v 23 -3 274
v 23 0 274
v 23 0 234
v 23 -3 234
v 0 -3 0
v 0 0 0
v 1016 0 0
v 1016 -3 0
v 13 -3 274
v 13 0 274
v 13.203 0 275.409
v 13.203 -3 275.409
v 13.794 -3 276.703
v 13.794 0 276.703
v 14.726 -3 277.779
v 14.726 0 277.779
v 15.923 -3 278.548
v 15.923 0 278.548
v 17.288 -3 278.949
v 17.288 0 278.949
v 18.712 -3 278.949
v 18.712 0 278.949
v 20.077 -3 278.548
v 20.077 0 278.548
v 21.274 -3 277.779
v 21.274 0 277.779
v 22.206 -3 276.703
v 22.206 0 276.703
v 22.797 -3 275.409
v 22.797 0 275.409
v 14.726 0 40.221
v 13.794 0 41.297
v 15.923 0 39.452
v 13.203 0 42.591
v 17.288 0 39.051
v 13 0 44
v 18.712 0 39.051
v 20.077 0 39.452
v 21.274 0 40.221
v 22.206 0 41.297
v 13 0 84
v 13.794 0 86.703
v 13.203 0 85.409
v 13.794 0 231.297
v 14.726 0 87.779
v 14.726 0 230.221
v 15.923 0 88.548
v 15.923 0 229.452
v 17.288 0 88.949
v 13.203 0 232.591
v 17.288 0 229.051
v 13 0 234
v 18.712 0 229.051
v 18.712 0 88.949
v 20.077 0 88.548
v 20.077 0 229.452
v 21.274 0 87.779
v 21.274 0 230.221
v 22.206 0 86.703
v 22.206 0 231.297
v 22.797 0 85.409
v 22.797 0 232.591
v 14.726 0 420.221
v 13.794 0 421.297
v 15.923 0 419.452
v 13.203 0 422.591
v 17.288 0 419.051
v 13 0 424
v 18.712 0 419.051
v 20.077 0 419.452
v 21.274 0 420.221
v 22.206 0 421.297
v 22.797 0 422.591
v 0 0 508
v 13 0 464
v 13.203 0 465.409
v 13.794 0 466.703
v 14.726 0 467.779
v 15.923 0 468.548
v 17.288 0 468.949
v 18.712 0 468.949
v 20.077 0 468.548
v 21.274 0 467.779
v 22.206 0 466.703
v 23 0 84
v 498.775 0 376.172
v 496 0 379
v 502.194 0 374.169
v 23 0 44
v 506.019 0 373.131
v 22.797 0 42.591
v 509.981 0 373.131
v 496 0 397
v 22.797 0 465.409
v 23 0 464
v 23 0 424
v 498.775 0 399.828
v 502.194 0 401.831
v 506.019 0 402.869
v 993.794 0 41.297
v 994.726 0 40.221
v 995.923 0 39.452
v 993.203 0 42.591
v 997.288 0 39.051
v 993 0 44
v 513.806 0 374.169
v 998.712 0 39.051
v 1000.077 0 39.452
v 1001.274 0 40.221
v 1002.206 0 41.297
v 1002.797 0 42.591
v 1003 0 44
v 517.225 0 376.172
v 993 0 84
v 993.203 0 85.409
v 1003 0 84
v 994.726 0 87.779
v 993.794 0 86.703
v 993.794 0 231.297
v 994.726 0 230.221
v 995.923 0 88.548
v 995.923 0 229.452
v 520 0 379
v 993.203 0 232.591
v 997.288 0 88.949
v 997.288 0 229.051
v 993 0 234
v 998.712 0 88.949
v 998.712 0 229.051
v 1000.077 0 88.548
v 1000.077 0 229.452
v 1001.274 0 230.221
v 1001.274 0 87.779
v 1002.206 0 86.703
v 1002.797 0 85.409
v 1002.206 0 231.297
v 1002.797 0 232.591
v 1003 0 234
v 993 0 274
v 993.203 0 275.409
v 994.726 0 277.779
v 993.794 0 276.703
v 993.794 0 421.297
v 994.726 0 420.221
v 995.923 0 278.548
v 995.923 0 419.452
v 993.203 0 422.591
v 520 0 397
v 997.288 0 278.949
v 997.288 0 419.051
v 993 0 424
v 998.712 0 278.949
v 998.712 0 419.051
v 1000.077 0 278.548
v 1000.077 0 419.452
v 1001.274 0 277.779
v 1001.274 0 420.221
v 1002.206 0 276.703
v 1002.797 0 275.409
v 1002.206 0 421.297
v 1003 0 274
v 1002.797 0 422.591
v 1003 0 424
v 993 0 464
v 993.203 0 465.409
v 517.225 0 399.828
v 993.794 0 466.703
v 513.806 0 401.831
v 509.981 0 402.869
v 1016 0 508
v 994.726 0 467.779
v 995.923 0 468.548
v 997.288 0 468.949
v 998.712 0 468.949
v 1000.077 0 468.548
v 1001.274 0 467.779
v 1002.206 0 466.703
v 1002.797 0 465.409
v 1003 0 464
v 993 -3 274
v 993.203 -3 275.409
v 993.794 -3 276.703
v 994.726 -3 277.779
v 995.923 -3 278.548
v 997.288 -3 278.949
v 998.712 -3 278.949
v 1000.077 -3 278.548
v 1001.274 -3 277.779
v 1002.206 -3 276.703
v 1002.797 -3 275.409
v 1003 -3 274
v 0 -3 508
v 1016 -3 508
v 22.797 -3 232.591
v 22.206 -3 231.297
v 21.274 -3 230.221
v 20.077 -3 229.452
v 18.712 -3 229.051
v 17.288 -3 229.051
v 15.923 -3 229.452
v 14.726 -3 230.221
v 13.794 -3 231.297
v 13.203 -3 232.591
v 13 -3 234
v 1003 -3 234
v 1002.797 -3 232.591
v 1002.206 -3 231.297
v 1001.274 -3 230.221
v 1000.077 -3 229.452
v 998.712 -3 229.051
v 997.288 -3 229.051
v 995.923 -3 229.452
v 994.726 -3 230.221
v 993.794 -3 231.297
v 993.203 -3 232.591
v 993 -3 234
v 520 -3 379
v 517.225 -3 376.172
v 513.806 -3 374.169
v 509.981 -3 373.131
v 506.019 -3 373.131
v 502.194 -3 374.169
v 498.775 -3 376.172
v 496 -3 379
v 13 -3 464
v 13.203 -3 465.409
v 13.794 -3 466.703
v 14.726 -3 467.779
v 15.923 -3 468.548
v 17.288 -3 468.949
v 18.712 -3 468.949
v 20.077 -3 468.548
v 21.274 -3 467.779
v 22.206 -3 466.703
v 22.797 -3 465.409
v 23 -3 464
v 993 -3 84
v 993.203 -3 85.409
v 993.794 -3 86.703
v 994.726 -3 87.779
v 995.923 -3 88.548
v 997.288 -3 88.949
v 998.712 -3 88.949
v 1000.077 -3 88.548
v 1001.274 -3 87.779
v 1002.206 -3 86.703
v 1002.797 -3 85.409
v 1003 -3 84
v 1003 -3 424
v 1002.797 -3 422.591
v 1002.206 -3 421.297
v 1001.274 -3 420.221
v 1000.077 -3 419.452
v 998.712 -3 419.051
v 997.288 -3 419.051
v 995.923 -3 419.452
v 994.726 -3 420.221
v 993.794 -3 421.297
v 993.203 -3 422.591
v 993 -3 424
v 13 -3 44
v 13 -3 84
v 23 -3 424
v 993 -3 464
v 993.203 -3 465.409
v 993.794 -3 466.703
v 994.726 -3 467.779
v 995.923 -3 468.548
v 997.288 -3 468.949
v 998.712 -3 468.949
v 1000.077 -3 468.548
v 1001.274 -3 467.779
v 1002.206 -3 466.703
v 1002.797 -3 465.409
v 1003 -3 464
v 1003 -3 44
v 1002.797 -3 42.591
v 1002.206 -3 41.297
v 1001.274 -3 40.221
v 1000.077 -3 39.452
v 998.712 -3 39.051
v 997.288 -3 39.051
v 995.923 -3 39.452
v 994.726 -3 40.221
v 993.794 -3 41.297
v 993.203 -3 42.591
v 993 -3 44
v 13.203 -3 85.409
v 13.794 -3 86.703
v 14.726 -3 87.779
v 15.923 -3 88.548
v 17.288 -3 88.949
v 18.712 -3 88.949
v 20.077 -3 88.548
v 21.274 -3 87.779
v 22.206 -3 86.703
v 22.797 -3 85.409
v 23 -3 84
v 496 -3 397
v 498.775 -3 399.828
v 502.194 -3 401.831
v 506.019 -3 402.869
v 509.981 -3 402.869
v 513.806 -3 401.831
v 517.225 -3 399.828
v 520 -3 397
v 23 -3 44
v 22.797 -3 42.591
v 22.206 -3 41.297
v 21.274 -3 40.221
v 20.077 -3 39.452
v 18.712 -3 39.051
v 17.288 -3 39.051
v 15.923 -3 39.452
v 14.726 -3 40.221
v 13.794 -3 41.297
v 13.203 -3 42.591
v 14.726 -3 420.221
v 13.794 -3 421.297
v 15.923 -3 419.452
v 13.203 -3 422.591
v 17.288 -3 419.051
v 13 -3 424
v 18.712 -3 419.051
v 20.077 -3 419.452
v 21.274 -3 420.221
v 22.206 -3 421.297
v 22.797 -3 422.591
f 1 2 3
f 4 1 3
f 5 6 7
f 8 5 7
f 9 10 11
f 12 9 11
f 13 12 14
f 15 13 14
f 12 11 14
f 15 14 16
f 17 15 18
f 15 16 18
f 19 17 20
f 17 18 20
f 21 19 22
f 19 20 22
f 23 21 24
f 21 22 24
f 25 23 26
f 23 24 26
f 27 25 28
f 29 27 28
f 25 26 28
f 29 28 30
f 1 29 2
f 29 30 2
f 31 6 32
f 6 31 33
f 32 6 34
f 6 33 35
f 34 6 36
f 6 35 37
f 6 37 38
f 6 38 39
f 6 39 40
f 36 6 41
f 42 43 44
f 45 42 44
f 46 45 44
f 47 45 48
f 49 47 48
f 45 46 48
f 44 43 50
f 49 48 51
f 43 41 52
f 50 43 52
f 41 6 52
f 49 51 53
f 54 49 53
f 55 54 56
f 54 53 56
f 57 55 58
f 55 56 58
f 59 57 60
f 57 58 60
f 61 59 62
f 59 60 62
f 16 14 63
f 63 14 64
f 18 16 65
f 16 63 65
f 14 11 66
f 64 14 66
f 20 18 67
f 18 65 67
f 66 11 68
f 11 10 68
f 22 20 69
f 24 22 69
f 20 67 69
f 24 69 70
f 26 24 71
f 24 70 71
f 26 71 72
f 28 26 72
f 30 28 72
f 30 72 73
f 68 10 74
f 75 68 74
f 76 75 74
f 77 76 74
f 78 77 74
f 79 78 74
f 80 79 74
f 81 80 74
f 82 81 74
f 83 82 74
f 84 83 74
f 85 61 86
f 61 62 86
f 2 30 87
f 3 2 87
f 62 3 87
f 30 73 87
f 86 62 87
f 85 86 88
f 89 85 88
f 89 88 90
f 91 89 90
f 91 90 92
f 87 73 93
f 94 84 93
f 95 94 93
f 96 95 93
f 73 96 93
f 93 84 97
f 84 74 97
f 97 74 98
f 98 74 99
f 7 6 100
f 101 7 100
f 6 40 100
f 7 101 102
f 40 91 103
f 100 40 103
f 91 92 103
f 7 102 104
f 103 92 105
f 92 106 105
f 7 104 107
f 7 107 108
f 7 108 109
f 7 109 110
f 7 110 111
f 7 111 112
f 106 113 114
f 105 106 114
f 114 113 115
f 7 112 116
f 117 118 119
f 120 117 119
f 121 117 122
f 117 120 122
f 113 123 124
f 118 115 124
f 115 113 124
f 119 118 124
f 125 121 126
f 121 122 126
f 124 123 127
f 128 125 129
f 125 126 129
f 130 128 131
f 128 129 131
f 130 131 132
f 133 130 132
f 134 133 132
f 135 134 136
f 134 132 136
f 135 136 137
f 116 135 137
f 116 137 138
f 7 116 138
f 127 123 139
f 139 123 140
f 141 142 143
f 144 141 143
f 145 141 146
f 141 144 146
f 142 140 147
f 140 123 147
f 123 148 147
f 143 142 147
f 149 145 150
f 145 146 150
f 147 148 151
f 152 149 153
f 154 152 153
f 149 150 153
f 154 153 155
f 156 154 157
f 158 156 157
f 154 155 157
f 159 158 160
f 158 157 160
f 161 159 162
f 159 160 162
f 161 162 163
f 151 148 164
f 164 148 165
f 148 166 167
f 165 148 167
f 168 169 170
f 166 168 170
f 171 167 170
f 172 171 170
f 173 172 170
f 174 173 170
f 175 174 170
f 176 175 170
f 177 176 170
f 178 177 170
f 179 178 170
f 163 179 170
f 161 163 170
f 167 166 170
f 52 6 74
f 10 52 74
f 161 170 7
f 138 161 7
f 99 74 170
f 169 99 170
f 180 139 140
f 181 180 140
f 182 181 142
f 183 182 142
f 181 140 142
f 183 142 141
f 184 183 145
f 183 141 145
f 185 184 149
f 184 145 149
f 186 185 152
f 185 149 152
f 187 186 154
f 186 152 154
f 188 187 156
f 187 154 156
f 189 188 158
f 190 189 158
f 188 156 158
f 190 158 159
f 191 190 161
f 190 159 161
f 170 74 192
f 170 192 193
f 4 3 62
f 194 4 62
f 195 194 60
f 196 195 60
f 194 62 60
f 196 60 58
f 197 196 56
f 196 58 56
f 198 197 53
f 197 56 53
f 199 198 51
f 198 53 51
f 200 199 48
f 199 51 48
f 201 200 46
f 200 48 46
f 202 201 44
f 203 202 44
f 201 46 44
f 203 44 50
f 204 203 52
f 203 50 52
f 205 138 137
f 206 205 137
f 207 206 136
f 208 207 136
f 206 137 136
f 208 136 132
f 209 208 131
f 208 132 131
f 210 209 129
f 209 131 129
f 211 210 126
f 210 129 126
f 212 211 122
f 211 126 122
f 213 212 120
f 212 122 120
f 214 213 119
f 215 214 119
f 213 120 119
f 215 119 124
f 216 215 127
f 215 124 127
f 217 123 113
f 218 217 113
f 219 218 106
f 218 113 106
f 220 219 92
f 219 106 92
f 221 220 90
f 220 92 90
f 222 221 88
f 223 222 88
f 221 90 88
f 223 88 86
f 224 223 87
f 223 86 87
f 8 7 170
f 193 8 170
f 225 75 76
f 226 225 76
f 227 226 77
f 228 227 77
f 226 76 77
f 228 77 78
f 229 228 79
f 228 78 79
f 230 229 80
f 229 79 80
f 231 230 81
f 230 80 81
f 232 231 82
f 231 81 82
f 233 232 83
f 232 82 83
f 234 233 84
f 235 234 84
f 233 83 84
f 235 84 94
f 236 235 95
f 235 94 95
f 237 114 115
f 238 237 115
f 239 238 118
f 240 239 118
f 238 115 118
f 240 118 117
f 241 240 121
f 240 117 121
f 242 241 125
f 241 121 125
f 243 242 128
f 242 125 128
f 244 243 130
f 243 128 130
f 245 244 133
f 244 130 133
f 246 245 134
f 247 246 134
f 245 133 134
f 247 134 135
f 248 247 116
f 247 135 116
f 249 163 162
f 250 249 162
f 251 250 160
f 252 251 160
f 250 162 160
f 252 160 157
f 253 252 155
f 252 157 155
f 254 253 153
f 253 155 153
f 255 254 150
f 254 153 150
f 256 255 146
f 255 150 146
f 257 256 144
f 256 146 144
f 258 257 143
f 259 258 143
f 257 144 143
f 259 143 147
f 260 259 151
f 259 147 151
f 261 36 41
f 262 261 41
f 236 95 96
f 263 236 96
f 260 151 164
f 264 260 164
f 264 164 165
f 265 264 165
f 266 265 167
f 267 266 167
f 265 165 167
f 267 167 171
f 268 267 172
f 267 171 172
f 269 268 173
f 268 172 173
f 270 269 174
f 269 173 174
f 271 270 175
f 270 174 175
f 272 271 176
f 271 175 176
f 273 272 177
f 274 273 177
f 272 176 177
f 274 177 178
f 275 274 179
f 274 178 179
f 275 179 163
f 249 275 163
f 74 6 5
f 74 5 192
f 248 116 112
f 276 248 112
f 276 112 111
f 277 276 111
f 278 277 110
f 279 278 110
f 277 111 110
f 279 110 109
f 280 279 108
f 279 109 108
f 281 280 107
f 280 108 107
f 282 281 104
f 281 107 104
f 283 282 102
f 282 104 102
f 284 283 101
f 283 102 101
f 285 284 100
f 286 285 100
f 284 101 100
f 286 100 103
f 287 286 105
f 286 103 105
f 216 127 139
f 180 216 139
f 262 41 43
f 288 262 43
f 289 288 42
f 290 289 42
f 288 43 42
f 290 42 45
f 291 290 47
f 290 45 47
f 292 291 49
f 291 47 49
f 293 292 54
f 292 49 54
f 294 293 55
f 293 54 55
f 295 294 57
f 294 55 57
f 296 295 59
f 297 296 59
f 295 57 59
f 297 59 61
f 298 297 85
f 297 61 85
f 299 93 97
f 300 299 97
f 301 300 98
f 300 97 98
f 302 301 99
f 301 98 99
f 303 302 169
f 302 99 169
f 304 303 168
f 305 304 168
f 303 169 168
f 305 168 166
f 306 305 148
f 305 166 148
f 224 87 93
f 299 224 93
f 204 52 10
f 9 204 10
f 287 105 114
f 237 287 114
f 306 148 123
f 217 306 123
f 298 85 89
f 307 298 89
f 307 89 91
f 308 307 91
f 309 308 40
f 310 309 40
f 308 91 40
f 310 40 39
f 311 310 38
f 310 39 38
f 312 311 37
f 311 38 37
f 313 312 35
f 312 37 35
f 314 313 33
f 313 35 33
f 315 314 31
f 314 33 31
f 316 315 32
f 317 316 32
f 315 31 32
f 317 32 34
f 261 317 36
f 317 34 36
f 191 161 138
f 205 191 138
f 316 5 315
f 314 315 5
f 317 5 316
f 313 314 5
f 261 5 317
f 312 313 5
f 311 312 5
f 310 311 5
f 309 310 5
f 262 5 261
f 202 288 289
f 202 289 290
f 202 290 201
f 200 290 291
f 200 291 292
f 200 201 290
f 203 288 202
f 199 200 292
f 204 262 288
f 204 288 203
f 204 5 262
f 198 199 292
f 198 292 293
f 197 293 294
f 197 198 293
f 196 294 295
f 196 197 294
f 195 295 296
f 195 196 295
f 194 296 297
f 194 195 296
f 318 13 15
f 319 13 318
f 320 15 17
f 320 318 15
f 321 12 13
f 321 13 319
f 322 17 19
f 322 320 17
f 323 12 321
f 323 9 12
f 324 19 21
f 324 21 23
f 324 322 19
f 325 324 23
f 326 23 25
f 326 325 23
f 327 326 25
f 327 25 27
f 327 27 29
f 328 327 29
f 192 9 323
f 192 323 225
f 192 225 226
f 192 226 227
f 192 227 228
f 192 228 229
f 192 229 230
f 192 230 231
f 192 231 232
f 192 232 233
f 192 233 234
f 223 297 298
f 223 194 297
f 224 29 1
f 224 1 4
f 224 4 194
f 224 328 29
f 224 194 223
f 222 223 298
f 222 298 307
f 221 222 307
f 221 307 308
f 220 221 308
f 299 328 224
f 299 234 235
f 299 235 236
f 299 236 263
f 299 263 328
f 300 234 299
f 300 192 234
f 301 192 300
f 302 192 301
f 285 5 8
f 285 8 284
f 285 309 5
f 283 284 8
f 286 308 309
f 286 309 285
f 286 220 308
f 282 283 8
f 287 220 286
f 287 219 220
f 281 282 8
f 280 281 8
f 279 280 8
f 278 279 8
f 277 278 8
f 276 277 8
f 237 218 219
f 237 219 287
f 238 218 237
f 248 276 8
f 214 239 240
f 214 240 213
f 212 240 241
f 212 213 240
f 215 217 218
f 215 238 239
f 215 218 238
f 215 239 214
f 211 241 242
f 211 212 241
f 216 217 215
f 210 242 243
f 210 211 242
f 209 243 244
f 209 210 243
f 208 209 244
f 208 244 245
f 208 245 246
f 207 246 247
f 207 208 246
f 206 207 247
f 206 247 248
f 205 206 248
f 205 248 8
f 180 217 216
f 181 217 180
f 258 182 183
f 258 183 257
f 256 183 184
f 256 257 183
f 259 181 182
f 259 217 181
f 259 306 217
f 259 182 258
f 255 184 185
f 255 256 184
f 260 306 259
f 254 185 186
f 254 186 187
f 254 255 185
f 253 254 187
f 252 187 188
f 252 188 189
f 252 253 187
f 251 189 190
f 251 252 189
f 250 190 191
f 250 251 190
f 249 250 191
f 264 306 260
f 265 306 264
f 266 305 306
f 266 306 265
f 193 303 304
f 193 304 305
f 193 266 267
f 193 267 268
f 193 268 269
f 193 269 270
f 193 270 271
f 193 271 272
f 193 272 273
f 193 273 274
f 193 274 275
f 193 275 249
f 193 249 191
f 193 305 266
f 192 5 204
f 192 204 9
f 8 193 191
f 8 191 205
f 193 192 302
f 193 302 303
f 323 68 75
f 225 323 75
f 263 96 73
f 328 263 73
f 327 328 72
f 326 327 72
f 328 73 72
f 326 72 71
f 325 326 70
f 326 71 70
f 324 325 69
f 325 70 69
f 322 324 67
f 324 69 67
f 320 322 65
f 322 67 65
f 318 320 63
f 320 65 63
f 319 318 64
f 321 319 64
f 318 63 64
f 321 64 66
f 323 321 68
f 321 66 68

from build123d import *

# Parameters (mm, degrees)
F0_W     = 1016
F0_H     = 508
F1_DEPTH = 3


with BuildPart() as f1:
    # F0 (on Front) → F1 (new body)
    with BuildSketch(Plane.XZ):
        with Locations((508, 254)):
            Rectangle(F0_W, F0_H)
        with BuildLine():
            ThreePointArc((13, 84), (18, 89), (23, 84))
            Line((23, 84), (23, 44))
            ThreePointArc((23, 44), (18, 39), (13, 44))
            Line((13, 44), (13, 84))
        make_face(mode=Mode.SUBTRACT)
        with BuildLine():
            ThreePointArc((1003, 44), (998, 39), (993, 44))
            Line((993, 44), (993, 84))
            ThreePointArc((993, 84), (998, 89), (1003, 84))
            Line((1003, 84), (1003, 44))
        make_face(mode=Mode.SUBTRACT)
        with BuildLine():
            ThreePointArc((13, 274), (18, 279), (23, 274))
            Line((23, 274), (23, 234))
            ThreePointArc((23, 234), (18, 229), (13, 234))
            Line((13, 234), (13, 274))
        make_face(mode=Mode.SUBTRACT)
        with BuildLine():
            ThreePointArc((13, 464), (18, 469), (23, 464))
            Line((23, 464), (23, 424))
            ThreePointArc((23, 424), (18, 419), (13, 424))
            Line((13, 424), (13, 464))
        make_face(mode=Mode.SUBTRACT)
        with BuildLine():
            ThreePointArc((993, 274), (998, 279), (1003, 274))
            Line((1003, 274), (1003, 234))
            ThreePointArc((1003, 234), (998, 229), (993, 234))
            Line((993, 234), (993, 274))
        make_face(mode=Mode.SUBTRACT)
        with BuildLine():
            ThreePointArc((520, 379), (508, 373), (496, 379))
            Line((496, 379), (496, 397))
            ThreePointArc((496, 397), (508, 403), (520, 397))
            Line((520, 397), (520, 379))
        make_face(mode=Mode.SUBTRACT)
        with BuildLine():
            ThreePointArc((993, 464), (998, 469), (1003, 464))
            Line((1003, 464), (1003, 424))
            ThreePointArc((1003, 424), (998, 419), (993, 424))
            Line((993, 424), (993, 464))
        make_face(mode=Mode.SUBTRACT)
    extrude(amount=F1_DEPTH)


solid = f1.part
